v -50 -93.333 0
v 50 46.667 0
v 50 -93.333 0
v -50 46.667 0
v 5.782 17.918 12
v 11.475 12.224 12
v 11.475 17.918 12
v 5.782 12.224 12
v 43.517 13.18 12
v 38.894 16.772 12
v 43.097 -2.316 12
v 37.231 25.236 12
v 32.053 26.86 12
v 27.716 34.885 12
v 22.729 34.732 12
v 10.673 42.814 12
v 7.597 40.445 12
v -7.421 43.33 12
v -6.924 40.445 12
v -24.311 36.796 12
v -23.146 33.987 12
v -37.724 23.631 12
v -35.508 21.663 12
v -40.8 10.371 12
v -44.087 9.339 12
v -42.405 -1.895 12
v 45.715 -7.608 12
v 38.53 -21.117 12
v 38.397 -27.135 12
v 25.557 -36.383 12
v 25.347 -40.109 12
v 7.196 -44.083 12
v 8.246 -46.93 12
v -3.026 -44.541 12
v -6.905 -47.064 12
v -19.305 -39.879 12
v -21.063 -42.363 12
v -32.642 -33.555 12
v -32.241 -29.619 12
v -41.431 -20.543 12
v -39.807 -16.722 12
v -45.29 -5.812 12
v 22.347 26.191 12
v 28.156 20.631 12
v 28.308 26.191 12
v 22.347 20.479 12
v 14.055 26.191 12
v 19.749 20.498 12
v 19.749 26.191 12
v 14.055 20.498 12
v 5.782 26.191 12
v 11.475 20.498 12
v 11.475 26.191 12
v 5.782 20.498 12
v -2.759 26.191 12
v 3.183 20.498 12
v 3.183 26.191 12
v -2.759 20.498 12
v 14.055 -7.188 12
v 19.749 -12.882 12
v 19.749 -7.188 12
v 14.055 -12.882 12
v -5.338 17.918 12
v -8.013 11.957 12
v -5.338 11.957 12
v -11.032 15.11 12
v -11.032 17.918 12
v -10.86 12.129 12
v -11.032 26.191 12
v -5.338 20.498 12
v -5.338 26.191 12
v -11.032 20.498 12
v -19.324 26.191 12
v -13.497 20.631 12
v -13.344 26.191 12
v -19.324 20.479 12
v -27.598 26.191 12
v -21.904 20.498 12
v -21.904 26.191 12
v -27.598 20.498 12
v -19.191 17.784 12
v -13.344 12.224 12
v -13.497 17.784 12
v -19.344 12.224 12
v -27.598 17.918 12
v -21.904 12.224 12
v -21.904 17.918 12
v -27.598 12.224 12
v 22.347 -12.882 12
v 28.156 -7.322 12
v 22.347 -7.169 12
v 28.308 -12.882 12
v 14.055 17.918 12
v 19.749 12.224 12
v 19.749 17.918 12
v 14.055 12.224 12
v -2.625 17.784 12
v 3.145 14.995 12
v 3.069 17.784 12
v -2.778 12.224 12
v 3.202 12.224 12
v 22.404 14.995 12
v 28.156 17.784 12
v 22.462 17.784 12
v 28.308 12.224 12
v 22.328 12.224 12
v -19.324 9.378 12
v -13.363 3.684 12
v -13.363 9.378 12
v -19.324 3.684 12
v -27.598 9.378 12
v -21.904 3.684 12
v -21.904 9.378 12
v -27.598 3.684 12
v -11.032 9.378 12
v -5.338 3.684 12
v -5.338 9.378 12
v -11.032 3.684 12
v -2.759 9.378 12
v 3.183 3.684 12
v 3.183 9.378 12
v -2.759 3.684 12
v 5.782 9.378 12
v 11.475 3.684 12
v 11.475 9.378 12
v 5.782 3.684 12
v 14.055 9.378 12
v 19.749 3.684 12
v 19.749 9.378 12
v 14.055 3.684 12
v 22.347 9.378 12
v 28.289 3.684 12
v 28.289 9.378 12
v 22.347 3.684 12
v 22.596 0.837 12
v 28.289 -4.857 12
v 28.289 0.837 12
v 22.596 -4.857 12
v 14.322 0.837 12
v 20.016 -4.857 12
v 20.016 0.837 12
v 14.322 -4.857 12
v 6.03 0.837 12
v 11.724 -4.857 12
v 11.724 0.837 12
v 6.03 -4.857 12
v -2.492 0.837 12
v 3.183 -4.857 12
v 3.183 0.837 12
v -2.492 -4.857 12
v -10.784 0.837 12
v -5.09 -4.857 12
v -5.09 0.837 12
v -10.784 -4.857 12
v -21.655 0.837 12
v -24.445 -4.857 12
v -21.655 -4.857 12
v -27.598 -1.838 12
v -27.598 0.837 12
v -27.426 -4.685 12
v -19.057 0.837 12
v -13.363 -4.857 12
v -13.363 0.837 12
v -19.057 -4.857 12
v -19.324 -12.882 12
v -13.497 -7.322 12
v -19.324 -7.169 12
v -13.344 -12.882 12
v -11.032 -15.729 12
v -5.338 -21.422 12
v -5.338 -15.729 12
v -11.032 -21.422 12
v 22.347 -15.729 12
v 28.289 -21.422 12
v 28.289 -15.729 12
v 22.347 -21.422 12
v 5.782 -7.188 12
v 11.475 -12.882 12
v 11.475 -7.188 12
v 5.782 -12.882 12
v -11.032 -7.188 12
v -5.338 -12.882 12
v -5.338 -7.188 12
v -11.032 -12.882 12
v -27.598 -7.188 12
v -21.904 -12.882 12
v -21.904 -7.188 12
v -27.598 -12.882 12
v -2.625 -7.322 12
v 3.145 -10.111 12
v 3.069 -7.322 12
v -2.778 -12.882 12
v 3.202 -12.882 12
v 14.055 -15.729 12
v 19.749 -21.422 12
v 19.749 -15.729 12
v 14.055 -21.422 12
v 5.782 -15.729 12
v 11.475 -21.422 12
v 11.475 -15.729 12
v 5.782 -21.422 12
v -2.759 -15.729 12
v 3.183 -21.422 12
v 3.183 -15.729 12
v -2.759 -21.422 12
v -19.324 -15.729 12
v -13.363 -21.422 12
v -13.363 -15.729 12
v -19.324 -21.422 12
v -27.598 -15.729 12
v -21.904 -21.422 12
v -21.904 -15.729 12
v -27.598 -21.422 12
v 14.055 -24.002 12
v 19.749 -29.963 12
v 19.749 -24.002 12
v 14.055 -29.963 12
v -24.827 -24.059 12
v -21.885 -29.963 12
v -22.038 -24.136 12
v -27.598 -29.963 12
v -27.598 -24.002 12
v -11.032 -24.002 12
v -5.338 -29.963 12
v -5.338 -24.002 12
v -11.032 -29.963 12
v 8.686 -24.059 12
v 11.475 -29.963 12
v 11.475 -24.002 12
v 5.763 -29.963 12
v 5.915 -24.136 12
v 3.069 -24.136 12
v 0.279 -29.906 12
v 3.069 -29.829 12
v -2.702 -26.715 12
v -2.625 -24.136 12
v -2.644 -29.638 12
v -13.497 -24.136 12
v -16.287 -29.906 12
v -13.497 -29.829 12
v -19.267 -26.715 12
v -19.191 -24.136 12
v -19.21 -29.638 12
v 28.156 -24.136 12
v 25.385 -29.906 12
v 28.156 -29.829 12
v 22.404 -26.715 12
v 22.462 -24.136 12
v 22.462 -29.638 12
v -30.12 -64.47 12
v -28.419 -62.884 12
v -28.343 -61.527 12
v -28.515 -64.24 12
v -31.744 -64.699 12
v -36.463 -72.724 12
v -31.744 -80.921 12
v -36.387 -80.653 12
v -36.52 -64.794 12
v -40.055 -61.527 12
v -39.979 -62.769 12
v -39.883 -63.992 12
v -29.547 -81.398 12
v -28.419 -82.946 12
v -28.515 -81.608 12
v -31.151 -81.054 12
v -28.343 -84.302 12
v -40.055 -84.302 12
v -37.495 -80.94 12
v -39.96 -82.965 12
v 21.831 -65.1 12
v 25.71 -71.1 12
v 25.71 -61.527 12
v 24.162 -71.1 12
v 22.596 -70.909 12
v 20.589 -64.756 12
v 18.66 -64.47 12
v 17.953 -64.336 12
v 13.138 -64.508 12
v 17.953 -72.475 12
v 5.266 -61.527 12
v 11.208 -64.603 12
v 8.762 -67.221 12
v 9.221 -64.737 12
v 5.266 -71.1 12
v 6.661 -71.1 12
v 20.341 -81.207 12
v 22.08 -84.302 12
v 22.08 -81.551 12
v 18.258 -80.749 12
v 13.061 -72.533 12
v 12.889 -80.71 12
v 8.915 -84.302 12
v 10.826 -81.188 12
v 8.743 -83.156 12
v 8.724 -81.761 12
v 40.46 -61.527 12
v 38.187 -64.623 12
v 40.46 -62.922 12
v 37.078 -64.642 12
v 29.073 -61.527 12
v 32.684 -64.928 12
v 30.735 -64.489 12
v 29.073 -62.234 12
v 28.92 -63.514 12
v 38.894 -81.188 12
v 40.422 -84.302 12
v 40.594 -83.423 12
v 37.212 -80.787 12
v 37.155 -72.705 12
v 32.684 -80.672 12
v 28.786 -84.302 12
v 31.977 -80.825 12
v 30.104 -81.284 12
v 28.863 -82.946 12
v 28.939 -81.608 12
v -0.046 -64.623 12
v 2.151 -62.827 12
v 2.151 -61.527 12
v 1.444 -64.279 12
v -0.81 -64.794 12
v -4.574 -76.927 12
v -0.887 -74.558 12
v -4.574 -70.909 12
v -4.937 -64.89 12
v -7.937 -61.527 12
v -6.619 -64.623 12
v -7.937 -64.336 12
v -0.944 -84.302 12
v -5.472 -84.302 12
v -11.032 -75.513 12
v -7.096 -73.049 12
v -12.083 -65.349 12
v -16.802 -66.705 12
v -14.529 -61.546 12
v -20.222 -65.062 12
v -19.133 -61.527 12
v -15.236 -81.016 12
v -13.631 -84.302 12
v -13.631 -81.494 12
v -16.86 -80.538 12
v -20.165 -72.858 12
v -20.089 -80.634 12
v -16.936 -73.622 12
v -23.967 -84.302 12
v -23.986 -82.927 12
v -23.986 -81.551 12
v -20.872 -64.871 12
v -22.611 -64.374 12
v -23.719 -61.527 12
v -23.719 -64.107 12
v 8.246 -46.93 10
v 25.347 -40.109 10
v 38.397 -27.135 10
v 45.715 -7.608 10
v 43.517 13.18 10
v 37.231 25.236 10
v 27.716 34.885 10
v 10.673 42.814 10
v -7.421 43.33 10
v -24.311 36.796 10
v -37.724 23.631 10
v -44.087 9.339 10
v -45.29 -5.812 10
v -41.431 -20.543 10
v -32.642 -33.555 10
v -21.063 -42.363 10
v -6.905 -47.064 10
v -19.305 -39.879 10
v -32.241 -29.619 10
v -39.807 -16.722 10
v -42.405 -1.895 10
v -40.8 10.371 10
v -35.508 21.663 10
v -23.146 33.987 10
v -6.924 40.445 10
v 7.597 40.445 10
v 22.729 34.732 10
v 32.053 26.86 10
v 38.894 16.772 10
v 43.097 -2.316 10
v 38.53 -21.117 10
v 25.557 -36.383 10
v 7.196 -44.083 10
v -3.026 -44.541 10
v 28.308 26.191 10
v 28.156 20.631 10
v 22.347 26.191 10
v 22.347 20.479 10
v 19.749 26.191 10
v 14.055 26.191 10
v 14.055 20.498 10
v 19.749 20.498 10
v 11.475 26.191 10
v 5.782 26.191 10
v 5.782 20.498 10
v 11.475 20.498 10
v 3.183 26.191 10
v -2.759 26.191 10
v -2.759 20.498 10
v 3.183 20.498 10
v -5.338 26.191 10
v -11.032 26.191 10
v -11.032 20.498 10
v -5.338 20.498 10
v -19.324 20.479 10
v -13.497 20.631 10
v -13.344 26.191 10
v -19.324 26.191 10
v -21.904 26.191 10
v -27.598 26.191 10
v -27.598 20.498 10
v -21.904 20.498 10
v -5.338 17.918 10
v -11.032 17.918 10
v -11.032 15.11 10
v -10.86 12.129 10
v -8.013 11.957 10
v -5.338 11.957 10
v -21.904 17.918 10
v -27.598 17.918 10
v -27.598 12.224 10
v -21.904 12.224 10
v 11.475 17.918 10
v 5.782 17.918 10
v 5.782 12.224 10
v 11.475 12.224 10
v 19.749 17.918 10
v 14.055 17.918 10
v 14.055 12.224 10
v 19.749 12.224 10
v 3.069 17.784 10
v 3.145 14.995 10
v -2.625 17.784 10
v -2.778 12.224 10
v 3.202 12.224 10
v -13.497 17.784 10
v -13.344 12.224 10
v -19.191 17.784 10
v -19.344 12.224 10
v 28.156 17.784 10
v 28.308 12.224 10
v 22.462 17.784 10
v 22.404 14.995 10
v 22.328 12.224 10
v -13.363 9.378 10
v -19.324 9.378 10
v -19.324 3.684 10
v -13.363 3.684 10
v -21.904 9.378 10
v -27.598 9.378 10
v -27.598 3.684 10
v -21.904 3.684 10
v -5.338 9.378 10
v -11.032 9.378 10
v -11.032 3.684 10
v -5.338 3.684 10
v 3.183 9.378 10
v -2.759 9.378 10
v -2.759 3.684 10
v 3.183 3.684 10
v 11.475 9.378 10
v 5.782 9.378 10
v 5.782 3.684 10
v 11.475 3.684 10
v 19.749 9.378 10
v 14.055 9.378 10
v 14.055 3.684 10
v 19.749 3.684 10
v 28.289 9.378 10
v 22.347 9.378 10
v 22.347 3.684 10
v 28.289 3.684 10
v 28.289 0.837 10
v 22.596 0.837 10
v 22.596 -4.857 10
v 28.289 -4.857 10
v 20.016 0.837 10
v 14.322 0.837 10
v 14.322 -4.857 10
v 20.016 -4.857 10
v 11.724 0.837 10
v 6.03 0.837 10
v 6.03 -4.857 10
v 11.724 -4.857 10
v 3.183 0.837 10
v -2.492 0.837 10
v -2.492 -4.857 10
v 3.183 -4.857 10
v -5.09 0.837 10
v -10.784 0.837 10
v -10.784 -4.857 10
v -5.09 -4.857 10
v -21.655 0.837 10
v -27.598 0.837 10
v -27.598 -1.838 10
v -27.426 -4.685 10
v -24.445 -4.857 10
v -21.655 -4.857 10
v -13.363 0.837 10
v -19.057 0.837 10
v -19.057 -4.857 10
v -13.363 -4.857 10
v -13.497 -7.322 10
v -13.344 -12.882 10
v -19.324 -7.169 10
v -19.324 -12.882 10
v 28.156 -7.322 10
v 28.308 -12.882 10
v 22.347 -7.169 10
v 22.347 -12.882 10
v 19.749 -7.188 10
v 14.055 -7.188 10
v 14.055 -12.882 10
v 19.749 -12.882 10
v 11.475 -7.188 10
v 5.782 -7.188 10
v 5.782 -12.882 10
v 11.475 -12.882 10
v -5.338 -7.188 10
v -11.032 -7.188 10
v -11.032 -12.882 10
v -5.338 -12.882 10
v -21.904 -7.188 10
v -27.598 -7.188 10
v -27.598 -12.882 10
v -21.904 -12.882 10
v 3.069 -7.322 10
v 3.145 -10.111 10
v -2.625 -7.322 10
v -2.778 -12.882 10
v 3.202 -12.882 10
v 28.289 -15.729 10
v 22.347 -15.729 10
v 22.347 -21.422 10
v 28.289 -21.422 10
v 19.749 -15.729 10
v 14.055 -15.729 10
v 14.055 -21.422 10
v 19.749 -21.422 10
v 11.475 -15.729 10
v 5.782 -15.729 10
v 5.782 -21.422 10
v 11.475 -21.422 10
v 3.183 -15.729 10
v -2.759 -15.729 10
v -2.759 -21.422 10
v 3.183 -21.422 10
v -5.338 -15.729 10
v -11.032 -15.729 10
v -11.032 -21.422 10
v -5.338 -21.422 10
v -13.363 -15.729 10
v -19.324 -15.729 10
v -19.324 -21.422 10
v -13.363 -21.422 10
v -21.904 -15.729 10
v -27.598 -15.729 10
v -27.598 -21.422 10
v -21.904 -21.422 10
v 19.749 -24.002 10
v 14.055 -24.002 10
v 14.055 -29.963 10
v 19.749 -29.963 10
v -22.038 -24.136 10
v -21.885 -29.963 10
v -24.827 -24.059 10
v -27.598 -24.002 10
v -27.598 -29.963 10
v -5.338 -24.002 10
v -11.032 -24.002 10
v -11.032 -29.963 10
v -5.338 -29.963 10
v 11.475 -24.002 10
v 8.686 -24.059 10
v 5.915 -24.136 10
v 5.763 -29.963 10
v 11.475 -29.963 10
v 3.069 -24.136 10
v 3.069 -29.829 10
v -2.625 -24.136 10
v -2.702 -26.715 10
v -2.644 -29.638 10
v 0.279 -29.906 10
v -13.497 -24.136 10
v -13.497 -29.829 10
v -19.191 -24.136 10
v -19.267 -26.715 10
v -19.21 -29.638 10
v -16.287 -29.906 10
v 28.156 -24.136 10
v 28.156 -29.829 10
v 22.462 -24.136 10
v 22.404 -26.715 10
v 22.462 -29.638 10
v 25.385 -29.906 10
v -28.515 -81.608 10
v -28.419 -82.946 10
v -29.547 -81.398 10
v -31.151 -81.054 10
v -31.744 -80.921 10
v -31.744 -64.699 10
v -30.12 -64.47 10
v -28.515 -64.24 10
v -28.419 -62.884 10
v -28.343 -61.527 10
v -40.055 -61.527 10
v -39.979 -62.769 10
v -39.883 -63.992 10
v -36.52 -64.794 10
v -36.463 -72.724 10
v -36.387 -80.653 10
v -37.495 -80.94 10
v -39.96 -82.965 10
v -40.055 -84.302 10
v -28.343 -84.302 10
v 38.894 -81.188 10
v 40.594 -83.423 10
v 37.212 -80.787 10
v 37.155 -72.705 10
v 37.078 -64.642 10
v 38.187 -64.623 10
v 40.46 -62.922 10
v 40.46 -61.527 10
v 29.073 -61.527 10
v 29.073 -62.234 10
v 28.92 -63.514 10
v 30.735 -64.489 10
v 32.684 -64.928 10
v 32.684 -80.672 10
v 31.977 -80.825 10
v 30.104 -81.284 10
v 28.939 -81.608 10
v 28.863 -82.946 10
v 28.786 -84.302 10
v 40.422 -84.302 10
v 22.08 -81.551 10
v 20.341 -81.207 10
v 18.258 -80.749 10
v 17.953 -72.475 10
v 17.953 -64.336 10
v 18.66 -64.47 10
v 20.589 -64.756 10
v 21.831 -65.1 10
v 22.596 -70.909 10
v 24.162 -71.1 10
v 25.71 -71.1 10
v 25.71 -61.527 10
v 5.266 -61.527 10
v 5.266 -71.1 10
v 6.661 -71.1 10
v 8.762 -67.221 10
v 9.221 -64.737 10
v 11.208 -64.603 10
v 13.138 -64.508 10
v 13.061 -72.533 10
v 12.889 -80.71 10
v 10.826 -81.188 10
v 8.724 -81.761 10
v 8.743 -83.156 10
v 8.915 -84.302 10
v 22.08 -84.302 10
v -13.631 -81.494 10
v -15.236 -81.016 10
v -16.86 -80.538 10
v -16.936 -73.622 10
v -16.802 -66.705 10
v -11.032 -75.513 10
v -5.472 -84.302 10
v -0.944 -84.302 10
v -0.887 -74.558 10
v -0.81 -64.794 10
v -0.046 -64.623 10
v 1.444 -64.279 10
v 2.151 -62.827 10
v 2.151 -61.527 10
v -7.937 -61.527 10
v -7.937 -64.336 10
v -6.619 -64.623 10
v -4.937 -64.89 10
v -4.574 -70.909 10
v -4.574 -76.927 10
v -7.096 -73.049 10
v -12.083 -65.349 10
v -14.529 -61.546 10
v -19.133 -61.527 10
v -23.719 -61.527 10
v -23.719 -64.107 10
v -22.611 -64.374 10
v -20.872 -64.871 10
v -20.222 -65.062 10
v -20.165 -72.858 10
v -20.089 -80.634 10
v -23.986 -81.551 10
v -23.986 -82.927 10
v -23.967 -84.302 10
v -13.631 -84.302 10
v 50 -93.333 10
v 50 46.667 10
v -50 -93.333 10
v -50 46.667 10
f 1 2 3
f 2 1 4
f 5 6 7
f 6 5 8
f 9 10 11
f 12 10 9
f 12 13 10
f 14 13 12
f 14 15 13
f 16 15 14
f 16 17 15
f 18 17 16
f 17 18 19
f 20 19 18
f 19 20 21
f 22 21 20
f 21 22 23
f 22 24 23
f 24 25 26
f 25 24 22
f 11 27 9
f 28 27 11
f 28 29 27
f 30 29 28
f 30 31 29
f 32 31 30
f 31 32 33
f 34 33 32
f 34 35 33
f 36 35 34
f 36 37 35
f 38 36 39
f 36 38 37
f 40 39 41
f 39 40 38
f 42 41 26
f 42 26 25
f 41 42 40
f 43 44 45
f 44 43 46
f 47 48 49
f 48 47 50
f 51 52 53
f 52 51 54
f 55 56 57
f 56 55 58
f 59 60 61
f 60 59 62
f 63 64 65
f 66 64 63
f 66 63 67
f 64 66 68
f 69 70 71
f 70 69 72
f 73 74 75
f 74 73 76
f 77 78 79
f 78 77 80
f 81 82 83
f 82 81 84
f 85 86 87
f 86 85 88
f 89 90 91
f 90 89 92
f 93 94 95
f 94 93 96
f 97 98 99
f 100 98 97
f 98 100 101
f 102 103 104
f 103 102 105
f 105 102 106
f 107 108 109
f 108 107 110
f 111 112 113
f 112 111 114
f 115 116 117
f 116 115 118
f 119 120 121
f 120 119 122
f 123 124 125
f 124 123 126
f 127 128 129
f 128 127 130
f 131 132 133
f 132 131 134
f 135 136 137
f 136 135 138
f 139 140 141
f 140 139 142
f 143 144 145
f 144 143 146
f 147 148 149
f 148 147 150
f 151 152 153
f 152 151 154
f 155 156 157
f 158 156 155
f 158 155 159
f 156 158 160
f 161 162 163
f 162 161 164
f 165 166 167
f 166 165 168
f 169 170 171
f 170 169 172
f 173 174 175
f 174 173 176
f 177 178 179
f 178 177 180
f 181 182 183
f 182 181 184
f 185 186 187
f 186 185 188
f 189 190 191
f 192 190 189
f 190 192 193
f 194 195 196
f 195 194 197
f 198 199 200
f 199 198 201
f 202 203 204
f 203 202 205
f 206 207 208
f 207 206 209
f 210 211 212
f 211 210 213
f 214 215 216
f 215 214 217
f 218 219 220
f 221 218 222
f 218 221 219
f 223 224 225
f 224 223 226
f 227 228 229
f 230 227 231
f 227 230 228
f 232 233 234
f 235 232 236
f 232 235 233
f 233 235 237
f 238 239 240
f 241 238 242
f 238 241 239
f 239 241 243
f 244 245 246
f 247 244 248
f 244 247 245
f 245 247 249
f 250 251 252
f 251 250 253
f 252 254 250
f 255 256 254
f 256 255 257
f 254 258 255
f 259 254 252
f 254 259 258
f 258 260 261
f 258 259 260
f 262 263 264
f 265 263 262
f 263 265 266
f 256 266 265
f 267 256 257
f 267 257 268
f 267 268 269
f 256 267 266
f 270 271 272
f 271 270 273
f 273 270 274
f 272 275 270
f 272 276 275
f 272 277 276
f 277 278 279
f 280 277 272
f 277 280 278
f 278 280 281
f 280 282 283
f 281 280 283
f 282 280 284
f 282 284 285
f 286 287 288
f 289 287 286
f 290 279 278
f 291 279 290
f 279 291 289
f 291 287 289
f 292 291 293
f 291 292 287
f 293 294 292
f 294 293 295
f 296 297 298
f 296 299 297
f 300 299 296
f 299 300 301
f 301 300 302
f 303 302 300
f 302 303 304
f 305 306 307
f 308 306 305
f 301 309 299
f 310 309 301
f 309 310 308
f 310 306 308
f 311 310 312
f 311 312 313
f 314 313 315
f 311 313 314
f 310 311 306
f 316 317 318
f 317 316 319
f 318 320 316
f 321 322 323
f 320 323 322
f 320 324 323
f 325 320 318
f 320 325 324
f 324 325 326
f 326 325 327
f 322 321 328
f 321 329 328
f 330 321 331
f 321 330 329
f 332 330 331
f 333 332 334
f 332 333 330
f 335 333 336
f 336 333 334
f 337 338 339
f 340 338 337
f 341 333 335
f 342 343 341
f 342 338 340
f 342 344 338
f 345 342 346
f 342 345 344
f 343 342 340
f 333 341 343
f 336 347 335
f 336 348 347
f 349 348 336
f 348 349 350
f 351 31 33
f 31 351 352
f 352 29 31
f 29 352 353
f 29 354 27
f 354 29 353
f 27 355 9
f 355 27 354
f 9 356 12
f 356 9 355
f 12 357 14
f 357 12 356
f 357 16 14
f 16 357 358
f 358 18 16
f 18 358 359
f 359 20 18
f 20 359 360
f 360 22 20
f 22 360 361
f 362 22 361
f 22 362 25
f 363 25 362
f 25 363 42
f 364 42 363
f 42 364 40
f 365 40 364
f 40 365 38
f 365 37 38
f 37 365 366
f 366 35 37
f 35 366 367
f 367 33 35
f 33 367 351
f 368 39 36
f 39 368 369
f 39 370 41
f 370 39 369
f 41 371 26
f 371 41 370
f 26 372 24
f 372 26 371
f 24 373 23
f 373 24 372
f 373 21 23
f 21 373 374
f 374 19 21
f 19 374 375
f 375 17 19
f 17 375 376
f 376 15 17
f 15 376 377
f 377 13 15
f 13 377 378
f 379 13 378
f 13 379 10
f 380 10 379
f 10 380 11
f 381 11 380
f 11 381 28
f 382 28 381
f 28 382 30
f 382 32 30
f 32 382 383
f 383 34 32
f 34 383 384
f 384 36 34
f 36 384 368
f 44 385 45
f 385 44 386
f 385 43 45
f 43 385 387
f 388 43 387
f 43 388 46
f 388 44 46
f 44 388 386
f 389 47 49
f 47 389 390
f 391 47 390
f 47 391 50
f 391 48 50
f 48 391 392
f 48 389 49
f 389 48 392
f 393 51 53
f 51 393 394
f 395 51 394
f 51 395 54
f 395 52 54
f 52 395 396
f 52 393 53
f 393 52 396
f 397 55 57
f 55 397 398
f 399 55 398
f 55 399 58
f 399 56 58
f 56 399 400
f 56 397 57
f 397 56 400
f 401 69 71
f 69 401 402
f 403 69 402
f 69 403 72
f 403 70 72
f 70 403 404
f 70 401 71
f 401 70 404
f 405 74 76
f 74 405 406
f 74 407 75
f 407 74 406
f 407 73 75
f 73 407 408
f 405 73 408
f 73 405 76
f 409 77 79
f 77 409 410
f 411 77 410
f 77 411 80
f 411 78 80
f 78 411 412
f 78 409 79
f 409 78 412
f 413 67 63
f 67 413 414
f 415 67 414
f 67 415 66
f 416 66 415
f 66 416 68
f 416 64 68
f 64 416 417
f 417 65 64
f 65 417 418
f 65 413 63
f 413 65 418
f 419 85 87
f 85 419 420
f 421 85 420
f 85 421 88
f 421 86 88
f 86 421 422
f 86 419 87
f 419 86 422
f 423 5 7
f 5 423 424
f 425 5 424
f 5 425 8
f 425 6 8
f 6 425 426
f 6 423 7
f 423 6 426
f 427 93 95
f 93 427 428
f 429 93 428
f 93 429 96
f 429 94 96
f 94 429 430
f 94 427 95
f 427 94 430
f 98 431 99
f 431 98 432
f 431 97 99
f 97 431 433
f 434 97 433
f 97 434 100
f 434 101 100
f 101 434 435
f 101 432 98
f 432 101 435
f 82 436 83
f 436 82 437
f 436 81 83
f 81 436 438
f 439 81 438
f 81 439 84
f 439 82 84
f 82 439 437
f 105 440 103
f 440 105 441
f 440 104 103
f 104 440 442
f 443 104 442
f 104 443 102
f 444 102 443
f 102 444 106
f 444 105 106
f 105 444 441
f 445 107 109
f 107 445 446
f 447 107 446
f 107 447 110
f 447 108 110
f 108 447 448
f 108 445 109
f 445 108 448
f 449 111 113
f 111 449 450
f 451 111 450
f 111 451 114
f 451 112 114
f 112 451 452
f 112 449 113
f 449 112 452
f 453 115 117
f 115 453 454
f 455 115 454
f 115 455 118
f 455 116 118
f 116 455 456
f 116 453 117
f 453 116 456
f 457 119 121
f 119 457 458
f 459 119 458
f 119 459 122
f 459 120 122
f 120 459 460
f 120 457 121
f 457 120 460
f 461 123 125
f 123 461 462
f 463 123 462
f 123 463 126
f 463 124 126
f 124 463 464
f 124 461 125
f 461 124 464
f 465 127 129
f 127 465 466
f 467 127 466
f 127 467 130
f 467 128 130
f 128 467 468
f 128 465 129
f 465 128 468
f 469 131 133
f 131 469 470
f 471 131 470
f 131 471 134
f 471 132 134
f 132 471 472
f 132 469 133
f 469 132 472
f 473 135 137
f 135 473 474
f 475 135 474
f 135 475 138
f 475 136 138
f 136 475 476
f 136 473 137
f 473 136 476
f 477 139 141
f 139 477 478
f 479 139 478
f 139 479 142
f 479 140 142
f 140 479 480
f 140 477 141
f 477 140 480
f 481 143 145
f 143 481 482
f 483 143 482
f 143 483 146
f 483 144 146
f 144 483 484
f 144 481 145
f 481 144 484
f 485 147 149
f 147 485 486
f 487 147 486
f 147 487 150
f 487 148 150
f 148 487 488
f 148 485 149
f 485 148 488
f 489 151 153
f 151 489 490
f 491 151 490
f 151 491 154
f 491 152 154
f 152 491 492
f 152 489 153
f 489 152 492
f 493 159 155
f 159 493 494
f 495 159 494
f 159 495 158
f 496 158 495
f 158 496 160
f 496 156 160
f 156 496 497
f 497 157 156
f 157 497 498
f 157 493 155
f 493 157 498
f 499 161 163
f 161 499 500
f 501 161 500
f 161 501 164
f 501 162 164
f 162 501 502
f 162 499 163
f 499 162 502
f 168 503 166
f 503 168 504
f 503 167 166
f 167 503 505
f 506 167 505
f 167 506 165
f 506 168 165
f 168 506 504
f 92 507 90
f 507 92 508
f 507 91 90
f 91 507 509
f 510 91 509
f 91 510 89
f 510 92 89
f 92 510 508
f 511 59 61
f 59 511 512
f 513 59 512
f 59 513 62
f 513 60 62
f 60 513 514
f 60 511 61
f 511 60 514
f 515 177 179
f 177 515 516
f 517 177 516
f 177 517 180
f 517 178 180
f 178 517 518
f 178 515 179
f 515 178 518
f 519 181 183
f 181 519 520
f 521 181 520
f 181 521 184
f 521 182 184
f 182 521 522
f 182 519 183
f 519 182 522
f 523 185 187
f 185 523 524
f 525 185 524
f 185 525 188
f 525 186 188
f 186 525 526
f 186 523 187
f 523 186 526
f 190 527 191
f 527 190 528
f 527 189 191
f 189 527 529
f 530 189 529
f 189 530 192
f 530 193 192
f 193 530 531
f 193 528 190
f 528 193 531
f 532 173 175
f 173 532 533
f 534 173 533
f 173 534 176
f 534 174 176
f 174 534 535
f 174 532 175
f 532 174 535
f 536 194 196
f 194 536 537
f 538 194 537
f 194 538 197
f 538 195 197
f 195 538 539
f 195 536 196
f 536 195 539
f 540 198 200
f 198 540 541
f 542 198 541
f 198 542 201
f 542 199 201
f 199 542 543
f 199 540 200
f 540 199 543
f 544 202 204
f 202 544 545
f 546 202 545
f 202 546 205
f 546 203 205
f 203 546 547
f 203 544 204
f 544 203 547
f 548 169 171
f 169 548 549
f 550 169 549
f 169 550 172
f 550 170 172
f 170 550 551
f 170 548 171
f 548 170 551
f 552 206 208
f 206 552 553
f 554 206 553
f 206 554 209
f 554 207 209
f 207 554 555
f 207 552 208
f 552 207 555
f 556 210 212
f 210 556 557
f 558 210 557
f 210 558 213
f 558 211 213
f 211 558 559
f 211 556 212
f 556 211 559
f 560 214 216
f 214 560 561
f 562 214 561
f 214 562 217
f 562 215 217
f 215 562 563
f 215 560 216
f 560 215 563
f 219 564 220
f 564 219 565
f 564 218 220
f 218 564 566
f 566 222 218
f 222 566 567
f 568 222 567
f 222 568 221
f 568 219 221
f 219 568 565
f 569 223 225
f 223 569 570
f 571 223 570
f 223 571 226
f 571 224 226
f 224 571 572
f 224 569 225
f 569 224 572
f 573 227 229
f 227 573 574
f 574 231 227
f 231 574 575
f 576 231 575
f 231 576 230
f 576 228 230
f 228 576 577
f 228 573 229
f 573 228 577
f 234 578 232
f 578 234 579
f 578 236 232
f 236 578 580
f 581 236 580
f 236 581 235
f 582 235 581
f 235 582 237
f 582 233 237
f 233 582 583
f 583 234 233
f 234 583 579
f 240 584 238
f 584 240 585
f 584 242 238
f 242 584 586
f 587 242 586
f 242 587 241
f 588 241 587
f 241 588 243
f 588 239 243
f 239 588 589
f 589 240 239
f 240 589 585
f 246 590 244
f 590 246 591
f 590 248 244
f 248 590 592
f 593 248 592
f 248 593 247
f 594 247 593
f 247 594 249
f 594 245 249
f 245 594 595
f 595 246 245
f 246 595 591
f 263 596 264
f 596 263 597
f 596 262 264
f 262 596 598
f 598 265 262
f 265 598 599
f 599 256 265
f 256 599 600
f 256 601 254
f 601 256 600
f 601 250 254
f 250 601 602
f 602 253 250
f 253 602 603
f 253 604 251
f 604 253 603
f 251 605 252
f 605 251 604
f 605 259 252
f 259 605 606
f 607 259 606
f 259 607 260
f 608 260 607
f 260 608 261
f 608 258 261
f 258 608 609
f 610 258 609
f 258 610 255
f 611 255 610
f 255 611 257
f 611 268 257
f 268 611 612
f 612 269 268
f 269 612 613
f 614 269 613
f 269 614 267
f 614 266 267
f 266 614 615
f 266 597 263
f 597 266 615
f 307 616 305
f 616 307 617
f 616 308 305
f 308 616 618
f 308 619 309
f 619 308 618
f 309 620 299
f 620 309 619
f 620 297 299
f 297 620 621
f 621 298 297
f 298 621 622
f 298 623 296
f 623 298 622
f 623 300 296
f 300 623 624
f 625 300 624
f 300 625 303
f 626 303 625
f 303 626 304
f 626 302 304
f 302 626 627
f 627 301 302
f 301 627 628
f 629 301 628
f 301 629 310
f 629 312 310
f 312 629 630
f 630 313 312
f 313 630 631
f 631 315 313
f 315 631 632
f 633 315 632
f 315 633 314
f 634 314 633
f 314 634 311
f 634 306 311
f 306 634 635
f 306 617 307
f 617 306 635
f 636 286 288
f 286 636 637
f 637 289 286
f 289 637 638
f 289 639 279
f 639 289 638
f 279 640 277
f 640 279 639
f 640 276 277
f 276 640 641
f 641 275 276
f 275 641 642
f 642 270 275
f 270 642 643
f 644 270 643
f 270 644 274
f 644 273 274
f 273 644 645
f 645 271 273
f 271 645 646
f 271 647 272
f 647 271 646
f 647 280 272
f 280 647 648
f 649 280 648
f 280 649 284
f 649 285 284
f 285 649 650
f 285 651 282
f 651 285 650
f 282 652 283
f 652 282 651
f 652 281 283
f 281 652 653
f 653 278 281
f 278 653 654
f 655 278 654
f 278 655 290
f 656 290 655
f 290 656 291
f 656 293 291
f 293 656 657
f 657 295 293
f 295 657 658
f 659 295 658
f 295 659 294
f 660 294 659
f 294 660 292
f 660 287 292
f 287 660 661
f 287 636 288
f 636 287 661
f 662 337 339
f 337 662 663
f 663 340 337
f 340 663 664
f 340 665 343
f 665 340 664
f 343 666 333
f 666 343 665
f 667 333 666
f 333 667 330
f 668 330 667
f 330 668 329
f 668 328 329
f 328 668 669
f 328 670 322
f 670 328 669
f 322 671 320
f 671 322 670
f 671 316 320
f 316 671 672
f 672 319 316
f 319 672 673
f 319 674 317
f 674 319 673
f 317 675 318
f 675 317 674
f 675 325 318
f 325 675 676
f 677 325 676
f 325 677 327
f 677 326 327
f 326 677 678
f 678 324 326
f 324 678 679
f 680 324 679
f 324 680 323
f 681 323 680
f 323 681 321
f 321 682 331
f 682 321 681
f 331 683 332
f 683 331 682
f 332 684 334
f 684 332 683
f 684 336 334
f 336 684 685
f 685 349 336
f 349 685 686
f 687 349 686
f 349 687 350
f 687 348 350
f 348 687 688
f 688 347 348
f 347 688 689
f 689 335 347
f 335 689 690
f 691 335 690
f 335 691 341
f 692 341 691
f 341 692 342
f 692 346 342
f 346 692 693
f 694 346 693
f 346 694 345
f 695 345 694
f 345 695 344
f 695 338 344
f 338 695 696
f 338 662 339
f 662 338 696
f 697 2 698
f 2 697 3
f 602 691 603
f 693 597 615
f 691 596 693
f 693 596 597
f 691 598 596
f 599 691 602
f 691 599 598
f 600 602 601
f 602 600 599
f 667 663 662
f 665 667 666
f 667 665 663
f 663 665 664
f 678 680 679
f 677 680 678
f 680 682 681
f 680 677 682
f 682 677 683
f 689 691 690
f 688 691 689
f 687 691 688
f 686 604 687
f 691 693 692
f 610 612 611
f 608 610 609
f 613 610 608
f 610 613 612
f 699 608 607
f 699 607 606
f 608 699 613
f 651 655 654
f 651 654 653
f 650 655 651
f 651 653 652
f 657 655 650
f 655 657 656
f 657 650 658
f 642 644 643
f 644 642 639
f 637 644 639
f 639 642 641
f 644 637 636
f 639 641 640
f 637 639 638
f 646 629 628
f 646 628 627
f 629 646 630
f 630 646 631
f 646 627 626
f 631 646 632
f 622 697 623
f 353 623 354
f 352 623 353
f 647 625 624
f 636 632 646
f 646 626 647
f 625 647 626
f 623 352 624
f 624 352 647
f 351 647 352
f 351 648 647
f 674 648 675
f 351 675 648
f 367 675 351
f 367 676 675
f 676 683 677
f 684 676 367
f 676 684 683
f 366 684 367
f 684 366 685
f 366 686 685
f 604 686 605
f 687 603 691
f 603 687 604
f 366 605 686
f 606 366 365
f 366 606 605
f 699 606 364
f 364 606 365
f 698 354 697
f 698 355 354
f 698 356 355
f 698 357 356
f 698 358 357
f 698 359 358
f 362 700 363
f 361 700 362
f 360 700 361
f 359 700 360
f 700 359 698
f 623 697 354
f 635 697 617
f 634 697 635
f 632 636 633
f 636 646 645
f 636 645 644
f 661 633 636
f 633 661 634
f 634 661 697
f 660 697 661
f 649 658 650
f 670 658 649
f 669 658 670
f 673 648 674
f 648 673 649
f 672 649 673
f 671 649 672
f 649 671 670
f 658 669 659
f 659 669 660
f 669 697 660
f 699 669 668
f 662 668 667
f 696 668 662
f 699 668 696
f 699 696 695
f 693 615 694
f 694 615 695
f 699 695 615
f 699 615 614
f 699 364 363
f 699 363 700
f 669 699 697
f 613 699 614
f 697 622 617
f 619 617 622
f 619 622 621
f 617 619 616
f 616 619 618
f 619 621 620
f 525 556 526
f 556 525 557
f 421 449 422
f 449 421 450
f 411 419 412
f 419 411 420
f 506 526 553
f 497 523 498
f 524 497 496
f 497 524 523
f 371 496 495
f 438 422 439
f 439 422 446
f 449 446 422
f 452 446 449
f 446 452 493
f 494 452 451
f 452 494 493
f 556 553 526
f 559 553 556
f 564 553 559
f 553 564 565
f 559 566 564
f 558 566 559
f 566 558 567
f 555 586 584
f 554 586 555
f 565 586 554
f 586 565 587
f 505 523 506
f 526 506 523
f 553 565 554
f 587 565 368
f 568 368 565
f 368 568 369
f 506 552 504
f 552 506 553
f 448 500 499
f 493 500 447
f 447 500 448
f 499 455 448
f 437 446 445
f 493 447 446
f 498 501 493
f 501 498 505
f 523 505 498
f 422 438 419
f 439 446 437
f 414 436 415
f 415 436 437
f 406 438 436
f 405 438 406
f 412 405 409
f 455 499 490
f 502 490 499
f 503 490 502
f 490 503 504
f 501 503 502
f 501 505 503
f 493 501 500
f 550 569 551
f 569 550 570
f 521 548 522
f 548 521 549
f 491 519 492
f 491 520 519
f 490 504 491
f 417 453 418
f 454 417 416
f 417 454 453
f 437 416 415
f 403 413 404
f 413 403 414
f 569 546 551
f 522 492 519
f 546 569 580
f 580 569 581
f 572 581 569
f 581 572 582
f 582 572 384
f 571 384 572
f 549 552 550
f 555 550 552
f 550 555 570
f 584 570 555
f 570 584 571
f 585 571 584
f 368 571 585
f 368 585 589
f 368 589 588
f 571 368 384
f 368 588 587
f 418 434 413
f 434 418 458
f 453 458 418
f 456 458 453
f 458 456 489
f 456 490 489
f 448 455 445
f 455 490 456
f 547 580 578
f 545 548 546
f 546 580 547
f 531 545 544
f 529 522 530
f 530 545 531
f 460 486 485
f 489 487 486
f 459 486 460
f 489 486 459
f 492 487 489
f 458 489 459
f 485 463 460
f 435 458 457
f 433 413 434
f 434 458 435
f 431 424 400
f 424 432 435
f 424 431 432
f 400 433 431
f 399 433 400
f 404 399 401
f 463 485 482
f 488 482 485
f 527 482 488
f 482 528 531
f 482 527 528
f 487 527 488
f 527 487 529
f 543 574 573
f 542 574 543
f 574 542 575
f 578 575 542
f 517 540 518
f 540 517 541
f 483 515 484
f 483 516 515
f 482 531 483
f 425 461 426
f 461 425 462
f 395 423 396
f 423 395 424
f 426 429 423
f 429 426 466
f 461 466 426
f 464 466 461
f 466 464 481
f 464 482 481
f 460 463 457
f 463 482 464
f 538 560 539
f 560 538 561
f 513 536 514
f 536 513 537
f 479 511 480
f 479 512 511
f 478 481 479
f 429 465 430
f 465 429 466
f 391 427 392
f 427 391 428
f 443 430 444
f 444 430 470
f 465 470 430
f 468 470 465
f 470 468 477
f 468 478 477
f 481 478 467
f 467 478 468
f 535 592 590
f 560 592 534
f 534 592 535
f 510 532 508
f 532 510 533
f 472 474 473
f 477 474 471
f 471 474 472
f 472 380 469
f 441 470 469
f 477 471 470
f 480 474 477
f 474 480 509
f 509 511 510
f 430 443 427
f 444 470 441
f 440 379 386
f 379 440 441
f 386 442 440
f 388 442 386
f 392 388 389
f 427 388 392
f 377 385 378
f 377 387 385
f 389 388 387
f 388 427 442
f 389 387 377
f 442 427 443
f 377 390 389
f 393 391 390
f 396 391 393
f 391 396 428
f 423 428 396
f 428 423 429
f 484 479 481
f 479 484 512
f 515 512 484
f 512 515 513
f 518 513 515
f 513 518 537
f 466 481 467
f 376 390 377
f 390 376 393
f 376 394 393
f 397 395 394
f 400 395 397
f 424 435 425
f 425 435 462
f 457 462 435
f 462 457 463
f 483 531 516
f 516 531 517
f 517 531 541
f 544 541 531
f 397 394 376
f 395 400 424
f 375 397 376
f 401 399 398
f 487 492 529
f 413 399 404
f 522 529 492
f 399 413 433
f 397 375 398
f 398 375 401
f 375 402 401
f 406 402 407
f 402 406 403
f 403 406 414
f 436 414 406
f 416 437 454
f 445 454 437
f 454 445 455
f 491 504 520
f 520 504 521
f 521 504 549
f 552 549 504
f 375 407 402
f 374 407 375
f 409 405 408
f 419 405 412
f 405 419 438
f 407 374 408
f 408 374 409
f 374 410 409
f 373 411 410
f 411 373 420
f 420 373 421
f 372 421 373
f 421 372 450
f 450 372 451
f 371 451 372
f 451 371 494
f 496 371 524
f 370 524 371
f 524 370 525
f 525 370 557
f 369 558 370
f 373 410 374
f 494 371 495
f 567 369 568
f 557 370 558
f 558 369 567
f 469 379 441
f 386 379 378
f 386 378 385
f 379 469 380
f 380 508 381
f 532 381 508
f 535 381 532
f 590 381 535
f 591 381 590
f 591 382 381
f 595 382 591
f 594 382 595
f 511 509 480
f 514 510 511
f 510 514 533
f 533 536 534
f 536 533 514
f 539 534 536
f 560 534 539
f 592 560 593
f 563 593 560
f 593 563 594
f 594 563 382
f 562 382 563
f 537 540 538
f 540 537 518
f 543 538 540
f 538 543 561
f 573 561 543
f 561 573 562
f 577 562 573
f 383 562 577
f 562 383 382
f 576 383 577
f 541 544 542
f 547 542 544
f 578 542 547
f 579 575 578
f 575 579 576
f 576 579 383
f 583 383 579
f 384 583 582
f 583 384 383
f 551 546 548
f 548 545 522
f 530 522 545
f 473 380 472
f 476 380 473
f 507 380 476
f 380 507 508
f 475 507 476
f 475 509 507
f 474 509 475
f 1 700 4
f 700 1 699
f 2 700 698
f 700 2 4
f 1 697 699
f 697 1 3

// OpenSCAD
// https://bohumirzamecnik.cz/blog/2016/how-to-make-stl-with-svg-logo-and-text-in-openscad/

module logo_inti(h=1,size=1) {
    linear_extrude(height=h) {
        scale(size/4.6)
            translate([-28.35,19.45,0])
                import("logo_inti/logo_inti.dxf");
    }
}

module logo_inti_con_marco(size=10, color_logo=[1,1,1], color_marco=[1,1,1]*.1) {
    color(color_logo)
        logo_inti(size=size*.9, h=size*.12);
    color(color_marco)
        translate([-size/2, -size*(1+.4)/1.5, 0])
            cube([size, size*(1+.4), size*.1]);
}

logo_inti_con_marco(size=100);
